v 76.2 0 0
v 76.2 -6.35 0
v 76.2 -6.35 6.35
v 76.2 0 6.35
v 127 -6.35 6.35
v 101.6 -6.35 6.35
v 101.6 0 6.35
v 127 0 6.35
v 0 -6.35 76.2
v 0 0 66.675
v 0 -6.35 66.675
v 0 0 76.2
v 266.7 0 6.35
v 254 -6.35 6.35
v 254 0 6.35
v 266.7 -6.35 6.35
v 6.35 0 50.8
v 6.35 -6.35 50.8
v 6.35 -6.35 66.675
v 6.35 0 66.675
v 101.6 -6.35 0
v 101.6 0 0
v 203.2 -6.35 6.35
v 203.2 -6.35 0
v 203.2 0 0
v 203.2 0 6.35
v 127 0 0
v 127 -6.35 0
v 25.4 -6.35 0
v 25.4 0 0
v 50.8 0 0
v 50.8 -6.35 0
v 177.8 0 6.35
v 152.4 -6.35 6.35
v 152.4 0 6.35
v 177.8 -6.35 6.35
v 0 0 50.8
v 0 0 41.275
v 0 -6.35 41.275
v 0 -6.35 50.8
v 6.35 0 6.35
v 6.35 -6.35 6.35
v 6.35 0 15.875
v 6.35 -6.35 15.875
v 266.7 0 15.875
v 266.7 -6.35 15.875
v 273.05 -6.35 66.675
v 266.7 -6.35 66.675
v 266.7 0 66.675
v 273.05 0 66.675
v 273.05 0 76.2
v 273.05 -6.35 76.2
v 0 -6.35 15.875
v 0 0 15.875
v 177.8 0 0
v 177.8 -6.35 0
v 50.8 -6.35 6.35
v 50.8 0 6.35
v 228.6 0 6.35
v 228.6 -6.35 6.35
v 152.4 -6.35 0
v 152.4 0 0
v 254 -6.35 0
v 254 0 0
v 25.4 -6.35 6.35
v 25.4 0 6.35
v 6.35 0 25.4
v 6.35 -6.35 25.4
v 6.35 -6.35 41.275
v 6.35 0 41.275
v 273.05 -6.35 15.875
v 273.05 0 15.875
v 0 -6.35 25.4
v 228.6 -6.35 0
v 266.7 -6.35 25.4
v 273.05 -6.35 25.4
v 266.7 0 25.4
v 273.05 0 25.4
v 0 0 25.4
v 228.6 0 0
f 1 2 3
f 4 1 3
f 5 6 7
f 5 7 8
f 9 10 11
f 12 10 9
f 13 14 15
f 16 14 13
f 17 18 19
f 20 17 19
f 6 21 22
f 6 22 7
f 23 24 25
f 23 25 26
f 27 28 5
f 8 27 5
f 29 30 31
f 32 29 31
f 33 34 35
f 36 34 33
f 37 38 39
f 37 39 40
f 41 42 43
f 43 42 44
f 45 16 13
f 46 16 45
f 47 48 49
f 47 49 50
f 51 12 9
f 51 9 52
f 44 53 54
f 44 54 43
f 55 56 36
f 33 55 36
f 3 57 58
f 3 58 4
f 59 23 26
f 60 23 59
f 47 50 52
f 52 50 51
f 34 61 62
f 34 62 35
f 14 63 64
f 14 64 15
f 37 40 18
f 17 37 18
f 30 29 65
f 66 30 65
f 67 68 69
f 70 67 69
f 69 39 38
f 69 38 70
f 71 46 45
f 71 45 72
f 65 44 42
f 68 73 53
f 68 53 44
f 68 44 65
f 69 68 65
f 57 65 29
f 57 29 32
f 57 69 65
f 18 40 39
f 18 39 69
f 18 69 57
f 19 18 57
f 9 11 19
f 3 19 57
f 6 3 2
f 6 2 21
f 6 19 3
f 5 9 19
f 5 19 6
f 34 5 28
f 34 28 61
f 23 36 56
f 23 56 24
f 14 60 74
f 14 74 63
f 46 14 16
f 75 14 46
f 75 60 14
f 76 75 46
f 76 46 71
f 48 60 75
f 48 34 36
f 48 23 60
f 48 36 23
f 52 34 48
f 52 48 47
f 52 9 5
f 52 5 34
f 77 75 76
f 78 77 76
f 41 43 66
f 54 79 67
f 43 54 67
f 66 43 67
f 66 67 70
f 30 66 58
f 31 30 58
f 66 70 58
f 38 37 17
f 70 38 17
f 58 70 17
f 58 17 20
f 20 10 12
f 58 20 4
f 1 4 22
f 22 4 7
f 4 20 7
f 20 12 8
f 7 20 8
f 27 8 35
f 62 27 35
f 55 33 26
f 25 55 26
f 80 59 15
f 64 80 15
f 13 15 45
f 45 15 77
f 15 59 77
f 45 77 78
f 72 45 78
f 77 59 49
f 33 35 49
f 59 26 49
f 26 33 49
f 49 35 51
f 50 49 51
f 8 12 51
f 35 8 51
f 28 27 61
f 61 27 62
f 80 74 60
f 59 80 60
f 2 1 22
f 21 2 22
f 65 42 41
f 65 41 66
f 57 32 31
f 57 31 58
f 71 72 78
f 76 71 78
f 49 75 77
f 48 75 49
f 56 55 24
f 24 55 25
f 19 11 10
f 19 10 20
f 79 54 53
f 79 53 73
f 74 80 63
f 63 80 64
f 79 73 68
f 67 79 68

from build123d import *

# Parameters (mm, degrees)
F0_W     = 273.05
F0_H     = 76.2
F1_DEPTH = 6.35
F2_W     = 6.35
F2_H     = 15.875
F2_H_2   = 9.525
F3_DEPTH = 6.35
F4_W     = 25.4
F4_H     = 6.35
F5_DEPTH = 6.351
F6_W     = 6.35
F6_H     = 9.525
F7_DEPTH = 6.35


with BuildPart() as f1:
    # F0 (on Front) → F1 (new body)
    with BuildSketch(Plane.XZ):
        with Locations((136.525, 38.1)):
            Rectangle(F0_W, F0_H)
    extrude(amount=F1_DEPTH)

    # F2 (on face) → F3 (cut, through all)
    with BuildSketch(Plane.XZ.offset(6.35)):
        with Locations((3.175, 58.7375)):
            Rectangle(F2_W, F2_H)
        with Locations((3.175, 33.3375)):
            Rectangle(F2_W, F2_H)
        with Locations((3.175, 11.1125)):
            Rectangle(F2_W, F2_H_2)
        with Locations((269.875, 11.1125)):
            Rectangle(F2_W, F2_H_2)
        with Locations((269.875, 33.3375)):
            Rectangle(F2_W, F2_H)
        with Locations((269.875, 58.7375)):
            Rectangle(F2_W, F2_H)
    extrude(amount=-F3_DEPTH, mode=Mode.SUBTRACT)

    # F4 (on face) → F5 (cut, through all)
    with BuildSketch(Plane.XZ.offset(6.35)):
        with Locations((12.7, 3.175)):
            Rectangle(F4_W, F4_H)
        with Locations((63.5, 3.175)):
            Rectangle(F4_W, F4_H)
        with Locations((114.3, 3.175)):
            Rectangle(F4_W, F4_H)
        with Locations((165.1, 3.175)):
            Rectangle(F4_W, F4_H)
        with Locations((215.9, 3.175)):
            Rectangle(F4_W, F4_H)
        with Locations((266.7, 3.175)):
            Rectangle(F4_W, F4_H)
    extrude(amount=-F5_DEPTH, mode=Mode.SUBTRACT)

    # F6 (on face) → F7 (cut, through all)
    with BuildSketch(Plane.XZ.offset(6.35)):
        with Locations((269.875, 46.0375)):
            Rectangle(F6_W, F6_H)
    extrude(amount=-F7_DEPTH, mode=Mode.SUBTRACT)


solid = f1.part
